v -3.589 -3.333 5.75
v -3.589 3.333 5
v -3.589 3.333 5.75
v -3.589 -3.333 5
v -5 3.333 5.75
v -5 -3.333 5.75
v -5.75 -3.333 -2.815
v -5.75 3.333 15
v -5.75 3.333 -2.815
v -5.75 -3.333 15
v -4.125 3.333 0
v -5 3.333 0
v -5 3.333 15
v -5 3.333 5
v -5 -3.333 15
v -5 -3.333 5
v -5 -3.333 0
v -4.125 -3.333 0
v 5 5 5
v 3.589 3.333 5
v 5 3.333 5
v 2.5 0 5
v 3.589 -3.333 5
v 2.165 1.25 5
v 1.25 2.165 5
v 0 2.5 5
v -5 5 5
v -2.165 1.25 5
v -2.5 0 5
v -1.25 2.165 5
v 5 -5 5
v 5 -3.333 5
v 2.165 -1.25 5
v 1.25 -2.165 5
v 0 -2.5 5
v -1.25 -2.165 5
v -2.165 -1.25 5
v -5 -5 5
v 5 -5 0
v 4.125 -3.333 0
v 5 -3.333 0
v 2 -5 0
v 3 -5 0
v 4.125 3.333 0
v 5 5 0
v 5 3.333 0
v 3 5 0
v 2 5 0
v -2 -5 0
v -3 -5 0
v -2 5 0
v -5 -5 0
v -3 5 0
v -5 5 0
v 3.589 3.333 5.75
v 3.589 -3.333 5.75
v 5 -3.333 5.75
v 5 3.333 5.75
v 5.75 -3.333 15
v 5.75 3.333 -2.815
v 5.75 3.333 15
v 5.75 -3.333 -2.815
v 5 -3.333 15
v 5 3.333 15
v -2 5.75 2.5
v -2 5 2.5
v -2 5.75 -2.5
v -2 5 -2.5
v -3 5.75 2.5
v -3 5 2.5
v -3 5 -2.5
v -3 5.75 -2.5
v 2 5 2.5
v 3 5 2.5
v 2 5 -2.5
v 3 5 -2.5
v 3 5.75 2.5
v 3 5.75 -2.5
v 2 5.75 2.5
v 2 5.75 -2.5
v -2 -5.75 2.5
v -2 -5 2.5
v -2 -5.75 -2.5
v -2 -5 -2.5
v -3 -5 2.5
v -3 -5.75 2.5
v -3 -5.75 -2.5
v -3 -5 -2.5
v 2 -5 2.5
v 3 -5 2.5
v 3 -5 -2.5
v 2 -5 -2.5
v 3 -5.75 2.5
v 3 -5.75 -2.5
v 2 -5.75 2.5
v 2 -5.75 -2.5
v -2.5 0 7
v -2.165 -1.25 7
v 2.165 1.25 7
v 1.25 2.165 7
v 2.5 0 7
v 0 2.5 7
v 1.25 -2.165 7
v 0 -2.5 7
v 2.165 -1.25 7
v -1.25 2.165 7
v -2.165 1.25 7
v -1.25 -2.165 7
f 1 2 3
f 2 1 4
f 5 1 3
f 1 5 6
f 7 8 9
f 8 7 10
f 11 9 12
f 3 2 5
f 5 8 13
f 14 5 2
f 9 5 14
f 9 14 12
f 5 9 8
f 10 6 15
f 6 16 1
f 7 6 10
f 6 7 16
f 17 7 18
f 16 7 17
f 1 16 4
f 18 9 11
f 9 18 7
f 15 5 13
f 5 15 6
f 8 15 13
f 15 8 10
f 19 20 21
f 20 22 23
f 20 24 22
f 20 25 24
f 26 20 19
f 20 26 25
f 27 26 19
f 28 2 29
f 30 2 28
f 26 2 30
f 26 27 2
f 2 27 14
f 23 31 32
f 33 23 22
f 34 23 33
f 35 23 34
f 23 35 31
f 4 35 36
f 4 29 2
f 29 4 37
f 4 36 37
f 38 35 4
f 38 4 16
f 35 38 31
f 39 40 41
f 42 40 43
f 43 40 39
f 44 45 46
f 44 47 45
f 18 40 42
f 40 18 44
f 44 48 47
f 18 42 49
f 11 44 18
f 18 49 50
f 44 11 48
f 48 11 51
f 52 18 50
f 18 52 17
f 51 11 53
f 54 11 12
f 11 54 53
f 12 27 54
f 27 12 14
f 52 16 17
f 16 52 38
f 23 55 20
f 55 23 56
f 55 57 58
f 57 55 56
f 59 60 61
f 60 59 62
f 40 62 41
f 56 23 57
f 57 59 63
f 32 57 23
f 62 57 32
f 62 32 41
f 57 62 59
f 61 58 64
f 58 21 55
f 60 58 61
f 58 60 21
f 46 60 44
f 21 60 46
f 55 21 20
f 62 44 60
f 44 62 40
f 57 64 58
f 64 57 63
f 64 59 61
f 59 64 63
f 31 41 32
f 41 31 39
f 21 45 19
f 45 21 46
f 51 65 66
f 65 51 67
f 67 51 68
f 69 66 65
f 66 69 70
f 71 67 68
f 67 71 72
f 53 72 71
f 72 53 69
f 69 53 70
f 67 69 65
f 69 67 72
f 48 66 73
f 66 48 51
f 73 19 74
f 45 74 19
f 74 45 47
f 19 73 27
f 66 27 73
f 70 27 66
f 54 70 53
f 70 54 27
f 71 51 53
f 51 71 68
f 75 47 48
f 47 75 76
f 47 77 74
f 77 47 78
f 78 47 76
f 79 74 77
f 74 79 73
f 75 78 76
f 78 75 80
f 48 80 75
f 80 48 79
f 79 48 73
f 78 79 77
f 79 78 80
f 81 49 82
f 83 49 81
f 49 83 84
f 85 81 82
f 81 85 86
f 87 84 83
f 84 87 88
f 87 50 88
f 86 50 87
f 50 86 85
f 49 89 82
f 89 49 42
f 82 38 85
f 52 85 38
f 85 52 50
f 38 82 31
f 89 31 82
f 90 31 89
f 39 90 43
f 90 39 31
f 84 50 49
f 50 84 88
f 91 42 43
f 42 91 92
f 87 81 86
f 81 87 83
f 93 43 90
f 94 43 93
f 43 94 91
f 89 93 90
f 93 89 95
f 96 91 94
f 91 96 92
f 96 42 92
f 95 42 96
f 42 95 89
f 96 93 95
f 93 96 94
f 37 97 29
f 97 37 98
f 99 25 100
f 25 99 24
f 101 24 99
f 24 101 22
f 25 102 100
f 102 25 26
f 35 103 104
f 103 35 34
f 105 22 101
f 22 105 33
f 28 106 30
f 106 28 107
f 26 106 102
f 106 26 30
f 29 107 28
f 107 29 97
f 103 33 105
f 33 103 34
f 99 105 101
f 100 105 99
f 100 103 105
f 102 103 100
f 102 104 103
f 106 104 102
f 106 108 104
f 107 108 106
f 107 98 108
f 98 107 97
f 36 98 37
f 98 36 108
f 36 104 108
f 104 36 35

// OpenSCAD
// This generates stand-in components and mounting hardware for tactile push buttons.
//
// Licensed under Creative Commons: Attribution, Share-Alike
//		http://creativecommons.org/licenses/by-sa/3.0/
// For attribution you can direct people to the original file on thingiverse:
// 		http://www.thingiverse.com/thing:1133485

/* [Visibility] */

// show the button
show_button=1; // [1:yes,0:no]

// show snap-clasps to hold the button
show_clasps=1; // [1:yes,0:no]

// Whether the generated model is in the pushed(down) state or is in the up state 
generate_pushed=1; // [1:pushed/down,0:released/up]

/* [Tactile Button Settings] */

// this is the width of the button body.  We assume its' square, so this is both x and y width.
body_width=10;

// how high the body is
body_height=5;

// the diameter of the button's post
post_dia=5;

// how high above the body the post is when it is all the way up
post_height_up=3;

// how high above the body the post is when it is pressed down
post_height_down=2;

// how wide the leads for the legs are
leg_width=1;

// how far apart the leads are (this is measured from the center of the leads)
leg_spacing=5;

/* [Clasp Settings] */

// How thick (and therefore, stiff) the clasps are
clasp_spring_thickness=0.75;

// How far the clasp extends from the button surface
clasp_extra_h=10;

/* [Hidden] */

scoche=0.05;
halfscoche=scoche/2;

// generates a tackie button, centered x,y on the origin but with its bottom on z=0
// (legs extend below the z plane)
// leg_spacing is center-to-center
module tackie(post_height,body_width=10,body_height=5,post_dia=5,leg_width=1,leg_spacing=3,leg_thickness=0.75) {
	center=-body_width/2;
	z_center=-body_height/2;
	legcenter=leg_width/2;
	union() {
		// the body
		color([0.25,0.25,0.25,0.99]) translate([center,center,0]) cube([body_width,body_width,body_height]);
		// the legs
		color([0.75,0.75,0.75,0.99]) union(){
			translate([-(leg_spacing/2+legcenter),-(center              ),z_center]) cube([leg_width,leg_thickness,body_height]);
			translate([ (leg_spacing/2-legcenter),-(center              ),z_center]) cube([leg_width,leg_thickness,body_height]);
			translate([-(leg_spacing/2+legcenter), (center-leg_thickness),z_center]) cube([leg_width,leg_thickness,body_height]);
			translate([ (leg_spacing/2-legcenter), (center-leg_thickness),z_center]) cube([leg_width,leg_thickness,body_height]);
		}
		// the button
		color([0.75,0.75,0.75,0.99]) translate([0,0,body_height]) cylinder(r=post_dia/2,h=post_height,$fn=12);
	}
}

// returns snap-clasps for a given tackie
module top_clasps(body_width=10,body_height=5,post_dia=5,spring_thickness=0.99,extra_h=10) {
	overhang_max=(body_width-post_dia)/2; // This is the max possible.  We may want less than this.
	overhang=(overhang_max+spring_thickness)*0.5;
	inside_overhang=overhang*1.33;
	snap_angle=30;
	spring_width=body_width*2/3;
	overshoot=overhang/tan(snap_angle);
	h=extra_h+body_height;
	for(a=[0:180:360]) rotate([0,0,a]) {
		difference(){
			translate([-body_width/2-spring_thickness,-spring_width/2,0]) union(){
				translate([0,0,0]) cube([spring_thickness,spring_width,h]);// the springy sides
				translate([0,0,-overshoot]) difference(){
					cube([inside_overhang,spring_width,overshoot+body_height+spring_thickness]); // the clip body
					rotate([0,snap_angle,0]) translate([0,-halfscoche,0]) cube([inside_overhang,spring_width+scoche,overshoot+body_height+spring_thickness]);
				}
			}
			translate([-body_width/2,-body_width/2,0]) cube([body_width,body_width,body_height]); // cut out the button body
		}
	}
}

if(show_clasps==1){
	color([1,0,0,0.75]) top_clasps(body_width,body_height,post_dia,clasp_spring_thickness,clasp_extra_h);
}

if(show_button==1){
	tackie(generate_pushed==1?post_height_down:post_height_up,body_width,body_height,post_dia,leg_width,leg_spacing);
}
